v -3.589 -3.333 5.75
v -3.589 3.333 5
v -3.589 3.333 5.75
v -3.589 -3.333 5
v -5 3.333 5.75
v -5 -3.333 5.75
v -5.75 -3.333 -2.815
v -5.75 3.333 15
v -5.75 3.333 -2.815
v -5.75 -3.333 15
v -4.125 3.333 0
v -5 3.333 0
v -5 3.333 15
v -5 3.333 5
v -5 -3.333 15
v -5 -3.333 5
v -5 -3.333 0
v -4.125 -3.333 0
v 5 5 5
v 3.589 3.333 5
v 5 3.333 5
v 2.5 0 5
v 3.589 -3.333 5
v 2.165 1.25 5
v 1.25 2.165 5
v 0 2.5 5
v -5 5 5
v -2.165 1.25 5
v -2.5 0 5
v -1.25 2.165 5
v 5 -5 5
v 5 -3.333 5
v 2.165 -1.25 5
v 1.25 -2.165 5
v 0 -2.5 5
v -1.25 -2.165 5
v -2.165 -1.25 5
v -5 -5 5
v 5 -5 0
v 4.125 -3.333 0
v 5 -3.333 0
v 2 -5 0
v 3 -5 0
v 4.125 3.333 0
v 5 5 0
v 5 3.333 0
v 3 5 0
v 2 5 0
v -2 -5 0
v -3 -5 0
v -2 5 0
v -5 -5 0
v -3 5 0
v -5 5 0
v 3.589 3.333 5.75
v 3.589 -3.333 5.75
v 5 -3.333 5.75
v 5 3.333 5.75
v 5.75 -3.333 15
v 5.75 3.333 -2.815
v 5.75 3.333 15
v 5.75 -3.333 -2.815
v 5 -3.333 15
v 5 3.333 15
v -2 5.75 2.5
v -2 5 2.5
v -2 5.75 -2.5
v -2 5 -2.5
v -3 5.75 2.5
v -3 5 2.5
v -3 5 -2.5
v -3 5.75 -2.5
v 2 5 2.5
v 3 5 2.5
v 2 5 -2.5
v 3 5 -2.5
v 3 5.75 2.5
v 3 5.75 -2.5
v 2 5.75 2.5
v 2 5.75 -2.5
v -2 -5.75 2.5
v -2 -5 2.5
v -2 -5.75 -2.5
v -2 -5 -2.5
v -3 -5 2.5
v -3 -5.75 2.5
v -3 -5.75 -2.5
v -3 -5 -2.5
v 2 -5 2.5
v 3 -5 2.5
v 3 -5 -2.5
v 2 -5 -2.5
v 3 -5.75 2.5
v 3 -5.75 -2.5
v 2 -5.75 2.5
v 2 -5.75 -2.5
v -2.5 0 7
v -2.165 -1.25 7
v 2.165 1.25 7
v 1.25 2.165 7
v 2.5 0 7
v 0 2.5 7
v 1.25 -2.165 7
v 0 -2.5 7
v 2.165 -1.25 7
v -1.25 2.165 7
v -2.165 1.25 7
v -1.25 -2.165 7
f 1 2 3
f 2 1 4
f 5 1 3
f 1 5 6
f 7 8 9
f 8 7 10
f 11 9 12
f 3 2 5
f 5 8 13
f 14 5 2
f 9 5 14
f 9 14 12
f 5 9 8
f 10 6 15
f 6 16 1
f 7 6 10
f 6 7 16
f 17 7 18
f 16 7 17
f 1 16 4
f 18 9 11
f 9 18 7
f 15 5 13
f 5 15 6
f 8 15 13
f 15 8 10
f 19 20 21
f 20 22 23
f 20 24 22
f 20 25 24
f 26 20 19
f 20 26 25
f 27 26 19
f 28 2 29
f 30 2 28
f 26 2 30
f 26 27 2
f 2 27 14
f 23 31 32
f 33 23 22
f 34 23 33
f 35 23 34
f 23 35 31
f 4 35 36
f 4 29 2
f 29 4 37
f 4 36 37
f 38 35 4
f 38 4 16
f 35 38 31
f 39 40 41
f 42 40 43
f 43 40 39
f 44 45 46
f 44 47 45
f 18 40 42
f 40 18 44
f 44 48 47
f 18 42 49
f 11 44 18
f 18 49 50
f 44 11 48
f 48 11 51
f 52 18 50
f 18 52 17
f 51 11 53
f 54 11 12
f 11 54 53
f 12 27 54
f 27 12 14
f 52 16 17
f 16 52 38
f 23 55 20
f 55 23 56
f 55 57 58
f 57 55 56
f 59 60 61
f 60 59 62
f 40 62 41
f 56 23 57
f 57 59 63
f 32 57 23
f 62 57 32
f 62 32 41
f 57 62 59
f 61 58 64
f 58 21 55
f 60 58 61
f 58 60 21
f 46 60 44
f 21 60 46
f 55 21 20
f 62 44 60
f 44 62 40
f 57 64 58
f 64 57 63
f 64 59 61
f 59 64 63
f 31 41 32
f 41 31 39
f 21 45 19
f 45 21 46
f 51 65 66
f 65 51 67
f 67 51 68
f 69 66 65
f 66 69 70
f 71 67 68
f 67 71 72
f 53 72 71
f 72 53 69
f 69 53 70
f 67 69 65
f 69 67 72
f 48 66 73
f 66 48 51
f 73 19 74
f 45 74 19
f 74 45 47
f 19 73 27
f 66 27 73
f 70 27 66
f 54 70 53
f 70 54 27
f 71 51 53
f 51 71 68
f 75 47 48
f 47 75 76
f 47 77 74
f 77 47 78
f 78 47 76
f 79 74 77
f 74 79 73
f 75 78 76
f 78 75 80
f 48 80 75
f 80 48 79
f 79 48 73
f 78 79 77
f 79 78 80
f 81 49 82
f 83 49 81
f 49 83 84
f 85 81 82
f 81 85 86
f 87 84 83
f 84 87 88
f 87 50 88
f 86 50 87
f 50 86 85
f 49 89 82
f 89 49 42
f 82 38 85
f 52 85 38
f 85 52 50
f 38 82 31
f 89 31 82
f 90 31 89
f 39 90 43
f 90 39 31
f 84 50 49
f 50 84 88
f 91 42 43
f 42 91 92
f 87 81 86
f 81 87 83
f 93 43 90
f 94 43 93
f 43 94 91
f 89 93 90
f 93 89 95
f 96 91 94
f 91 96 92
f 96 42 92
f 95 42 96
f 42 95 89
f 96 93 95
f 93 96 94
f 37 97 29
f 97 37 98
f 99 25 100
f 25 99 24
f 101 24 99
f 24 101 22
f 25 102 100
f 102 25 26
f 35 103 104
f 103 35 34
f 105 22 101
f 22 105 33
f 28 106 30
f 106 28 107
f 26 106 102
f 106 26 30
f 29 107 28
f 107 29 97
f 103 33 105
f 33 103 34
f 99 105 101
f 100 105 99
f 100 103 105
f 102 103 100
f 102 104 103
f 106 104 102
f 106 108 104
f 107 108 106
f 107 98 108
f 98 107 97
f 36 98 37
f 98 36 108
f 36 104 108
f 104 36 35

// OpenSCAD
// This generates stand-in components and mounting hardware for tactile push buttons.
//
// Licensed under Creative Commons: Attribution, Share-Alike
//		http://creativecommons.org/licenses/by-sa/3.0/
// For attribution you can direct people to the original file on thingiverse:
// 		http://www.thingiverse.com/thing:1133485

/* [Visibility] */

// show the button
show_button=1; // [1:yes,0:no]

// show snap-clasps to hold the button
show_clasps=1; // [1:yes,0:no]

// Whether the generated model is in the pushed(down) state or is in the up state 
generate_pushed=1; // [1:pushed/down,0:released/up]

/* [Tactile Button Settings] */

// this is the width of the button body.  We assume its' square, so this is both x and y width.
body_width=10;

// how high the body is
body_height=5;

// the diameter of the button's post
post_dia=5;

// how high above the body the post is when it is all the way up
post_height_up=3;

// how high above the body the post is when it is pressed down
post_height_down=2;

// how wide the leads for the legs are
leg_width=1;

// how far apart the leads are (this is measured from the center of the leads)
leg_spacing=5;

/* [Clasp Settings] */

// How thick (and therefore, stiff) the clasps are
clasp_spring_thickness=0.75;

// How far the clasp extends from the button surface
clasp_extra_h=10;

/* [Hidden] */

scoche=0.05;
halfscoche=scoche/2;

// generates a tackie button, centered x,y on the origin but with its bottom on z=0
// (legs extend below the z plane)
// leg_spacing is center-to-center
module tackie(post_height,body_width=10,body_height=5,post_dia=5,leg_width=1,leg_spacing=3,leg_thickness=0.75) {
	center=-body_width/2;
	z_center=-body_height/2;
	legcenter=leg_width/2;
	union() {
		// the body
		color([0.25,0.25,0.25,0.99]) translate([center,center,0]) cube([body_width,body_width,body_height]);
		// the legs
		color([0.75,0.75,0.75,0.99]) union(){
			translate([-(leg_spacing/2+legcenter),-(center              ),z_center]) cube([leg_width,leg_thickness,body_height]);
			translate([ (leg_spacing/2-legcenter),-(center              ),z_center]) cube([leg_width,leg_thickness,body_height]);
			translate([-(leg_spacing/2+legcenter), (center-leg_thickness),z_center]) cube([leg_width,leg_thickness,body_height]);
			translate([ (leg_spacing/2-legcenter), (center-leg_thickness),z_center]) cube([leg_width,leg_thickness,body_height]);
		}
		// the button
		color([0.75,0.75,0.75,0.99]) translate([0,0,body_height]) cylinder(r=post_dia/2,h=post_height,$fn=12);
	}
}

// returns snap-clasps for a given tackie
module top_clasps(body_width=10,body_height=5,post_dia=5,spring_thickness=0.99,extra_h=10) {
	overhang_max=(body_width-post_dia)/2; // This is the max possible.  We may want less than this.
	overhang=(overhang_max+spring_thickness)*0.5;
	inside_overhang=overhang*1.33;
	snap_angle=30;
	spring_width=body_width*2/3;
	overshoot=overhang/tan(snap_angle);
	h=extra_h+body_height;
	for(a=[0:180:360]) rotate([0,0,a]) {
		difference(){
			translate([-body_width/2-spring_thickness,-spring_width/2,0]) union(){
				translate([0,0,0]) cube([spring_thickness,spring_width,h]);// the springy sides
				translate([0,0,-overshoot]) difference(){
					cube([inside_overhang,spring_width,overshoot+body_height+spring_thickness]); // the clip body
					rotate([0,snap_angle,0]) translate([0,-halfscoche,0]) cube([inside_overhang,spring_width+scoche,overshoot+body_height+spring_thickness]);
				}
			}
			translate([-body_width/2,-body_width/2,0]) cube([body_width,body_width,body_height]); // cut out the button body
		}
	}
}

if(show_clasps==1){
	color([1,0,0,0.75]) top_clasps(body_width,body_height,post_dia,clasp_spring_thickness,clasp_extra_h);
}

if(show_button==1){
	tackie(generate_pushed==1?post_height_down:post_height_up,body_width,body_height,post_dia,leg_width,leg_spacing);
}
